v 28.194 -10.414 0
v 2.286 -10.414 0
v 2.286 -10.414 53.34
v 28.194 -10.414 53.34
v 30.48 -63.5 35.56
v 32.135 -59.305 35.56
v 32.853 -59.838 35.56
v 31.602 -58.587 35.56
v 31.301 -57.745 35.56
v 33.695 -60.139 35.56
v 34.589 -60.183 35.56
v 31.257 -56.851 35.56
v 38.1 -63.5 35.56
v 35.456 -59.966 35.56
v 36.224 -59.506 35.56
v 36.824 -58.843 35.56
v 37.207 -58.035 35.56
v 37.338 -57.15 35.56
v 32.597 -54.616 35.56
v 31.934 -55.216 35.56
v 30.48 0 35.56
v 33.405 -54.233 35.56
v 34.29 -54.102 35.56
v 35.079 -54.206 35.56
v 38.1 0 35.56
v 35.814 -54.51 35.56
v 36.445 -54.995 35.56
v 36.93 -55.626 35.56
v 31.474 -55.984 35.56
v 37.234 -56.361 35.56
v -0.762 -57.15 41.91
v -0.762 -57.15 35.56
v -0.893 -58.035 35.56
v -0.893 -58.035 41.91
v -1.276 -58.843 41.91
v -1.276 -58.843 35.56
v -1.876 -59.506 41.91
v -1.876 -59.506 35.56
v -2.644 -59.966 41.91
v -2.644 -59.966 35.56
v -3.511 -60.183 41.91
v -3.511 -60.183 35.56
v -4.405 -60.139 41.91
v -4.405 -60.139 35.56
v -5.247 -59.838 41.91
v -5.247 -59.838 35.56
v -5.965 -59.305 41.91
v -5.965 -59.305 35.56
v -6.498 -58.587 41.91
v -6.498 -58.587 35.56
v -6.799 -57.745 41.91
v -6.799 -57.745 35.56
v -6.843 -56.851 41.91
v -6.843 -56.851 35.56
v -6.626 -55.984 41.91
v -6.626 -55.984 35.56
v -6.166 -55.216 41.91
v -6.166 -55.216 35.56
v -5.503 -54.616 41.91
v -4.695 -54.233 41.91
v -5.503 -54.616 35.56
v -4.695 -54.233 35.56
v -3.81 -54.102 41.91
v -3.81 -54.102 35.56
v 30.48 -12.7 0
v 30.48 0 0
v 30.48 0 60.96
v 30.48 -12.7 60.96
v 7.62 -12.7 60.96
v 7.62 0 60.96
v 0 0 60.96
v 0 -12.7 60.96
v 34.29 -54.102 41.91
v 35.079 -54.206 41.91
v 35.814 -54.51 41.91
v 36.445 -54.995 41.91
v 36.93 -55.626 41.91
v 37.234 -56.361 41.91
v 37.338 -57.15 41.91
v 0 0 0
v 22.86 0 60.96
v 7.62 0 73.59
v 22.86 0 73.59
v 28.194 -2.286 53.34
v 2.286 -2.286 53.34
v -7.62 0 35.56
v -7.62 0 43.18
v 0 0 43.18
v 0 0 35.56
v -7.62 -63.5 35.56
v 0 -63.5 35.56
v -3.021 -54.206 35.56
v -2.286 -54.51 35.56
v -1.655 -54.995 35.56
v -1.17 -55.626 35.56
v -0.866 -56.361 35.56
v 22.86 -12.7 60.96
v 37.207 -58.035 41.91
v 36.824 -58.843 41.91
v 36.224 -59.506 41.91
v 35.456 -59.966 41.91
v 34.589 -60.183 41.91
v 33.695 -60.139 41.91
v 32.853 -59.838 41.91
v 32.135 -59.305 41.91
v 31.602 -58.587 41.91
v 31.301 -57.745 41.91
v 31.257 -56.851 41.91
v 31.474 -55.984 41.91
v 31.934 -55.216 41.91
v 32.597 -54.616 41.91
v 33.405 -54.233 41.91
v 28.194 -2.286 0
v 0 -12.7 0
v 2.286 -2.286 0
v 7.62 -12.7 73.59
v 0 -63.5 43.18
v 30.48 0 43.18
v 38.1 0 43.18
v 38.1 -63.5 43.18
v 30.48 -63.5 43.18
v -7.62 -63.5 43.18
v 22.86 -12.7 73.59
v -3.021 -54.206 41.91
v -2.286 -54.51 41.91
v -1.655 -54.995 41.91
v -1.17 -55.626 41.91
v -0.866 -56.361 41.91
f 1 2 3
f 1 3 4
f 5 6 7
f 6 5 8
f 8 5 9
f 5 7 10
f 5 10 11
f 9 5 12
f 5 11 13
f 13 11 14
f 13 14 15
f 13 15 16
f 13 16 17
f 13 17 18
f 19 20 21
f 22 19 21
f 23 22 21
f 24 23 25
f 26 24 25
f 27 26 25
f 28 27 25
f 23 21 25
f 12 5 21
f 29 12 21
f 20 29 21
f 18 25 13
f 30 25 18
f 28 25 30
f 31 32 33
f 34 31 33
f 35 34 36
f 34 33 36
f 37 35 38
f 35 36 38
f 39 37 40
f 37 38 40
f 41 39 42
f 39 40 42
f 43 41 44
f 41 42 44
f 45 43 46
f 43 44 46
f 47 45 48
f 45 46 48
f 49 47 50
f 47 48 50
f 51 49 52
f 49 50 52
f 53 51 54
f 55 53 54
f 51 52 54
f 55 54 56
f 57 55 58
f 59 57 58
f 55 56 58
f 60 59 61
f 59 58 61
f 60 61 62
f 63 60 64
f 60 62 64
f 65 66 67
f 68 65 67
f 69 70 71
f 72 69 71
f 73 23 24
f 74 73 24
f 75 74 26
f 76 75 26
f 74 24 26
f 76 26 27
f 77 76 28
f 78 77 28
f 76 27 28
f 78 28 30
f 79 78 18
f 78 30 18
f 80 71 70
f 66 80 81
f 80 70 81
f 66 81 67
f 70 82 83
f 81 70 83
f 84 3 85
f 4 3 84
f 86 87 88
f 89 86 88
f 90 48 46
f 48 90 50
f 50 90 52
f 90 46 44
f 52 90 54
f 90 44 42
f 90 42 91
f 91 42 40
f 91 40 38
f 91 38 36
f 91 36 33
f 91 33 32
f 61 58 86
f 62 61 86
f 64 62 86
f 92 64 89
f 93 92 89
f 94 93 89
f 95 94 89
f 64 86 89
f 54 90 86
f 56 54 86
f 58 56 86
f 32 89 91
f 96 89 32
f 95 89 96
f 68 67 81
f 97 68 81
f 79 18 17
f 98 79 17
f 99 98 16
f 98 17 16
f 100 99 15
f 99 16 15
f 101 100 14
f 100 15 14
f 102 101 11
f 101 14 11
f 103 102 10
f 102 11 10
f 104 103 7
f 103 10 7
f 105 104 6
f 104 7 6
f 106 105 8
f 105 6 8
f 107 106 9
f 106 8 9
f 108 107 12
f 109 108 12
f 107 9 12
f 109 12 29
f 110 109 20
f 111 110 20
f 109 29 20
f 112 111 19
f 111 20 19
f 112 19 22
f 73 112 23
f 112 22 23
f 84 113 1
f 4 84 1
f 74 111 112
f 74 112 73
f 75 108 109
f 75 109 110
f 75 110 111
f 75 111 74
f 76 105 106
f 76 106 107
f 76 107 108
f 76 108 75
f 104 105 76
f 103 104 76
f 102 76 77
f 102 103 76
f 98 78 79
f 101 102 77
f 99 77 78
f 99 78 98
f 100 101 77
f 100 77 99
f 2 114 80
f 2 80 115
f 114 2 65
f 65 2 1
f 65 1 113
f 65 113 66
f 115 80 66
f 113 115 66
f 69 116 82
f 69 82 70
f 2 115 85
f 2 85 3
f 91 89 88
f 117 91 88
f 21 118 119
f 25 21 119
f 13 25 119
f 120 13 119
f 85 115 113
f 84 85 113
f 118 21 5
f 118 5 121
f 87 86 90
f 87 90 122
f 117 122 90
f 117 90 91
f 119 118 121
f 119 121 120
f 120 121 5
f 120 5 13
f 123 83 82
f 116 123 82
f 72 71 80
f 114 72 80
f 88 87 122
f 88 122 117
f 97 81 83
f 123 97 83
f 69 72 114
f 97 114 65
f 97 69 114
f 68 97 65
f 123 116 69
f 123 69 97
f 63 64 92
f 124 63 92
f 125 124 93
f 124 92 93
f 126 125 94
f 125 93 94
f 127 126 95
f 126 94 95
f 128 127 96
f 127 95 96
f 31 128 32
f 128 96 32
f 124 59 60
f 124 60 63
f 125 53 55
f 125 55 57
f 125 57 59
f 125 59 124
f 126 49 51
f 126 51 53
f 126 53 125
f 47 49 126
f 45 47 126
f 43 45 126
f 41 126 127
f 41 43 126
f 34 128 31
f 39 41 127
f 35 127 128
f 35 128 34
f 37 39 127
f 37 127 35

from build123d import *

# Parameters (mm, degrees)
F2_DEPTH  = 12.7
F3_W      = 7.62
F3_H      = 7.62
F4_DEPTH  = 63.5
F8_DEPTH  = 6.35
F10_DEPTH = 6.35
F11_W     = 25.908
F11_H     = 8.128
F12_DEPTH = 53.34


with BuildPart() as f2:
    # F0 (on Front) → F2 (new body)
    with BuildSketch(Plane.XZ):
        Polygon((0, 60.96), (0, 0), (30.48, 0), (30.48, 60.96), (22.86, 60.96), (22.86, 73.58956), (7.62, 73.58956), (7.62, 60.96), align=None)
    extrude(amount=F2_DEPTH)

    # F11 (on face) → F12 (cut)
    with BuildSketch(Plane(origin=(0, 0, 0), x_dir=(1, 0, 0), z_dir=(0, 0, -1))):
        with Locations((15.24, 6.35)):
            Rectangle(F11_W, F11_H)
    extrude(amount=-F12_DEPTH, mode=Mode.SUBTRACT)


with BuildPart() as f4:
    # F3 (on Front) → F4 (new body)
    with BuildSketch(Plane.XZ):
        with Locations((-3.81, 39.37)):
            Rectangle(F3_W, F3_H)
        with Locations((34.29, 39.37)):
            Rectangle(F3_W, F3_H)
    extrude(amount=F4_DEPTH)

    # F5 (on face) → F8 (cut)
    with BuildSketch(Plane(origin=(0, 0, 35.56), x_dir=(1, 0, 0), z_dir=(0, 0, -1))):
        with BuildLine():
            ThreePointArc((-0.762, 57.15), (-5.965261, 59.305261), (-3.81, 54.102))
            ThreePointArc((-3.81, 54.102), (-1.654739, 54.994739), (-0.762, 57.15))
        make_face()
    extrude(amount=-F8_DEPTH, mode=Mode.SUBTRACT)

    # F6 (on face) → F10 (cut)
    with BuildSketch(Plane(origin=(0, 0, 35.56), x_dir=(1, 0, 0), z_dir=(0, 0, -1))):
        with BuildLine():
            ThreePointArc((37.338, 57.15), (32.134739, 59.305261), (34.29, 54.102))
            ThreePointArc((34.29, 54.102), (36.445261, 54.994739), (37.338, 57.15))
        make_face()
    extrude(amount=-F10_DEPTH, mode=Mode.SUBTRACT)


solid = Compound([f2.part, f4.part])
